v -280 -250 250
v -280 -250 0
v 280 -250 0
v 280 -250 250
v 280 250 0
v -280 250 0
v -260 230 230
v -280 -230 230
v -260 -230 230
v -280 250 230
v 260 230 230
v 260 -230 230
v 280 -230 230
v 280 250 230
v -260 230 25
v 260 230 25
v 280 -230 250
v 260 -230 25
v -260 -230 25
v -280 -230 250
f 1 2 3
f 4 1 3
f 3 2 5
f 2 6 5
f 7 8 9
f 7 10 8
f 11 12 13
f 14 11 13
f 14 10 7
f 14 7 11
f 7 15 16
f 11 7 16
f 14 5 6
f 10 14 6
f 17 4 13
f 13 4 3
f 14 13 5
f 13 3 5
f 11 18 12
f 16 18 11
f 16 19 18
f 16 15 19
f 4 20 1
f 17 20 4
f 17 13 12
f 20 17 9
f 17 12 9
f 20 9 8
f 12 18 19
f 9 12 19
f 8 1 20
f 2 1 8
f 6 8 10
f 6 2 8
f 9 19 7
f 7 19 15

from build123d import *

# Parameters (mm, degrees)
F0_W     = 20
F0_H     = 460
F0_H_2   = 20
F0_W_2   = 520
F1_DEPTH = 230
F2_DEPTH = 250
F3_DEPTH = 25


with BuildPart() as f1:
    # F0 (on Top) → F1 (new body)
    with BuildSketch(Plane.XY):
        with Locations((-270, 0)):
            Rectangle(F0_W, F0_H)
        with Locations((-270, 240)):
            Rectangle(F0_W, F0_H_2)
        with Locations((0, 240)):
            Rectangle(F0_W_2, F0_H_2)
        with Locations((270, 0)):
            Rectangle(F0_W, F0_H)
        with Locations((270, 240)):
            Rectangle(F0_W, F0_H_2)
    extrude(amount=F1_DEPTH)

    # F0 (on Top) → F2 (join)
    with BuildSketch(Plane.XY):
        with Locations((-270, -240)):
            Rectangle(F0_W, F0_H_2)
        with Locations((0, -240)):
            Rectangle(F0_W_2, F0_H_2)
        with Locations((270, -240)):
            Rectangle(F0_W, F0_H_2)
    extrude(amount=F2_DEPTH)

    # F0 (on Top) → F3 (join)
    with BuildSketch(Plane.XY):
        with Locations((270, -240)):
            Rectangle(F0_W, F0_H_2)
        with Locations((0, -240)):
            Rectangle(F0_W_2, F0_H_2)
        with Locations((270, 0)):
            Rectangle(F0_W, F0_H)
        with Locations((-270, -240)):
            Rectangle(F0_W, F0_H_2)
        with Locations((270, 240)):
            Rectangle(F0_W, F0_H_2)
        with Locations((-270, 0)):
            Rectangle(F0_W, F0_H)
        with Locations((0, 240)):
            Rectangle(F0_W_2, F0_H_2)
        with Locations((-270, 240)):
            Rectangle(F0_W, F0_H_2)
        Rectangle(F0_W_2, F0_H)
    extrude(amount=F3_DEPTH)


solid = f1.part
